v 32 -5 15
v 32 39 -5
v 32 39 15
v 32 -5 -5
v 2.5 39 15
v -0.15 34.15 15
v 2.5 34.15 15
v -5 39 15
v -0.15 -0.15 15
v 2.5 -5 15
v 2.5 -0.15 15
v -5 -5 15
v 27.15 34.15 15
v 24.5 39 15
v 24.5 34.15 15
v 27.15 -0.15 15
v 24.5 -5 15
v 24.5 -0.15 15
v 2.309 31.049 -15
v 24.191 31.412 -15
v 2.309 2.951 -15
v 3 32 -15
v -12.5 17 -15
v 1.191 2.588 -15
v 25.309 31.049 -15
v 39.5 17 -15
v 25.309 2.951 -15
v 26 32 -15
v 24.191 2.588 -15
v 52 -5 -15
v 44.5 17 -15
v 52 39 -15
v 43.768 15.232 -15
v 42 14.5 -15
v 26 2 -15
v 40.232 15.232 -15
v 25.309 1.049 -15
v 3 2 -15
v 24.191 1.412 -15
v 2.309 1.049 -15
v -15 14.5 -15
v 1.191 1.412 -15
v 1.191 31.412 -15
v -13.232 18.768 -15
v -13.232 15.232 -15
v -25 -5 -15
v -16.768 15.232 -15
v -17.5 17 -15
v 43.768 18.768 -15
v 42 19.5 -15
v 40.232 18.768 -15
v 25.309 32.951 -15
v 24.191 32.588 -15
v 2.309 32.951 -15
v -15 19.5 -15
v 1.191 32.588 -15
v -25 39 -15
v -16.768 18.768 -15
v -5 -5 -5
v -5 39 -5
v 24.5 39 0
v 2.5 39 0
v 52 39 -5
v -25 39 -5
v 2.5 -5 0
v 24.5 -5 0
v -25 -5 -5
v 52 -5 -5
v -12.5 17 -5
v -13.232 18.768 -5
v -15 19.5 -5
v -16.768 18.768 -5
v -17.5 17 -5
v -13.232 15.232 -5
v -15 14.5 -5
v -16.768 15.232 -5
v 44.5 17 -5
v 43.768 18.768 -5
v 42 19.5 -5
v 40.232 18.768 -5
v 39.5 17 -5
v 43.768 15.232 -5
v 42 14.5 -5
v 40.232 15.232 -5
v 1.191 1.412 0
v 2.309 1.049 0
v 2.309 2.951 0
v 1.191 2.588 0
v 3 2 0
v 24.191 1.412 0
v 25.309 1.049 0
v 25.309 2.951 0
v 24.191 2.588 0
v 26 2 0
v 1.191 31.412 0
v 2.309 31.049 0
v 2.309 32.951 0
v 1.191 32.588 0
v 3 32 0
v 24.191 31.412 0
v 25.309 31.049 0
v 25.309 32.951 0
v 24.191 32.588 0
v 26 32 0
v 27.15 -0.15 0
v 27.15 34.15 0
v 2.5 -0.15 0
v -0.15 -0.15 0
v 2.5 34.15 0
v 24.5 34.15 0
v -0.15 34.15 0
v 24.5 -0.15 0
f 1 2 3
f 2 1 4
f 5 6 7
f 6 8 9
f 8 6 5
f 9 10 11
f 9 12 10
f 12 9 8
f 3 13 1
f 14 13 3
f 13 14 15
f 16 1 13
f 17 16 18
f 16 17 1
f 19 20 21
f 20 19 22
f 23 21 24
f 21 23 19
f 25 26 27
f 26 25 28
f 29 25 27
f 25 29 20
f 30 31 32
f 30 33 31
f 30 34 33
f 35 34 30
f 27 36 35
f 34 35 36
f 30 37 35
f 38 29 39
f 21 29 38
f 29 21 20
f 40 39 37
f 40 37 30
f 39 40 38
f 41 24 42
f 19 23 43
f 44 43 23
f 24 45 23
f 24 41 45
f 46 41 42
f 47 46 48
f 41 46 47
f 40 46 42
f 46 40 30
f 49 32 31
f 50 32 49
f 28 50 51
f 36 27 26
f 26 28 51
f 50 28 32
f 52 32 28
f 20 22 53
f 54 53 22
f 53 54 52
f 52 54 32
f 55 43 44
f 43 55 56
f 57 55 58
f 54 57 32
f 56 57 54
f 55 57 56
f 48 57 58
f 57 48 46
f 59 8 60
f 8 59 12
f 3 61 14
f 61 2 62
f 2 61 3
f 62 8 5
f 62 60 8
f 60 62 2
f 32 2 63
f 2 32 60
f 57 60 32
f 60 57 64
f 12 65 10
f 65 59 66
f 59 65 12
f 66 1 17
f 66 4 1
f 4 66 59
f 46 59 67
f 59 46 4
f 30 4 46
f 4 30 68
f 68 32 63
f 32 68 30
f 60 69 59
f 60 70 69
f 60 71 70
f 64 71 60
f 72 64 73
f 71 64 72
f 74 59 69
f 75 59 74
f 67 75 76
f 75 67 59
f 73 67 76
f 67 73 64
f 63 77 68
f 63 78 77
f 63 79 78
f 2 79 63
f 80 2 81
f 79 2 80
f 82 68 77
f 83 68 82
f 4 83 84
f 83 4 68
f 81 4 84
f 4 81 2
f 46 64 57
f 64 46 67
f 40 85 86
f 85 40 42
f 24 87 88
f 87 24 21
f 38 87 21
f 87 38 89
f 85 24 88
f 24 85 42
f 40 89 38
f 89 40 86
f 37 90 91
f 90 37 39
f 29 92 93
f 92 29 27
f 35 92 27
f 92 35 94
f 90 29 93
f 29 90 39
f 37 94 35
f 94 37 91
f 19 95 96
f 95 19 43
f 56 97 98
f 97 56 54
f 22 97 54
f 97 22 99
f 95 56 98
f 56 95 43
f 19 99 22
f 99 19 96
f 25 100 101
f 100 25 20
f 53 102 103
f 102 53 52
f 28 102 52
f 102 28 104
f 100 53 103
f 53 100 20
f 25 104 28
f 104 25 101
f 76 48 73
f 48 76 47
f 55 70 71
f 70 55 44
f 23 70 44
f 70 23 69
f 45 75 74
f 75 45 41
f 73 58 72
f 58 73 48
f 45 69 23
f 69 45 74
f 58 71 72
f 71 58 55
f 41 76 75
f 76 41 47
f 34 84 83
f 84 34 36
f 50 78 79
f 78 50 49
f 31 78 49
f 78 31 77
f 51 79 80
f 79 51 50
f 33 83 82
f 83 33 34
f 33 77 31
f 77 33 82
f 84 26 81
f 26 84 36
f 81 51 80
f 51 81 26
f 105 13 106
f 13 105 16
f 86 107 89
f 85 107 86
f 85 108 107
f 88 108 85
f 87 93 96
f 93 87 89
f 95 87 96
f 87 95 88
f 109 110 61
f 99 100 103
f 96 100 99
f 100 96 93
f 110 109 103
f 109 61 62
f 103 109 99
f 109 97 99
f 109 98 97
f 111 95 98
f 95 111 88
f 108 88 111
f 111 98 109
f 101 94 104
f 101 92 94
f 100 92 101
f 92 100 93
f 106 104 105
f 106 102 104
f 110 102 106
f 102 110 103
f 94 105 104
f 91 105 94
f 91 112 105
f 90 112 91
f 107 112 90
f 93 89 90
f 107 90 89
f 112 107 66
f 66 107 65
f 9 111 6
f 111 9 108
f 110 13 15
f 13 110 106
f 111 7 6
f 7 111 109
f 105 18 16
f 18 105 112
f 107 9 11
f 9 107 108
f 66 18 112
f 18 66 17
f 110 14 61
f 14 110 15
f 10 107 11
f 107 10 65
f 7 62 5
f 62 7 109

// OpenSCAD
thick=10;
w=27;
l=34;
tol=0.3;
difference() {
    difference() { 
        union() { 
            translate([-thick/2,-thick/2,-thick*1.5]) cube([w+thick,l+thick,15+thick*1.5]);
            translate([-thick/2-thick*2,-thick/2,-thick*1.5]) cube([w+thick*5,l+thick,10]);
        }
        x=2;
        translate([x,x,-20]) cylinder(40,1,1);
        translate([w-x,x,-20]) cylinder(40,1,1);
        translate([x,l-x,-20]) cylinder(40,1,1);
        translate([w-x,l-x,-20]) cylinder(40,1,1);
        
        
        translate([-thick*1.5,l/2,-20]) cylinder(40,2.5,2.5);
        translate([w+thick*1.5,l/2,-20]) cylinder(40,2.5,2.5);
    }
    
    union() {
        translate([-tol/2,-tol/2,0]) cube([w+tol,l+tol,20]);
        translate([2.5,-10,0]) cube([w-5,l+20,30]);
    }
}
